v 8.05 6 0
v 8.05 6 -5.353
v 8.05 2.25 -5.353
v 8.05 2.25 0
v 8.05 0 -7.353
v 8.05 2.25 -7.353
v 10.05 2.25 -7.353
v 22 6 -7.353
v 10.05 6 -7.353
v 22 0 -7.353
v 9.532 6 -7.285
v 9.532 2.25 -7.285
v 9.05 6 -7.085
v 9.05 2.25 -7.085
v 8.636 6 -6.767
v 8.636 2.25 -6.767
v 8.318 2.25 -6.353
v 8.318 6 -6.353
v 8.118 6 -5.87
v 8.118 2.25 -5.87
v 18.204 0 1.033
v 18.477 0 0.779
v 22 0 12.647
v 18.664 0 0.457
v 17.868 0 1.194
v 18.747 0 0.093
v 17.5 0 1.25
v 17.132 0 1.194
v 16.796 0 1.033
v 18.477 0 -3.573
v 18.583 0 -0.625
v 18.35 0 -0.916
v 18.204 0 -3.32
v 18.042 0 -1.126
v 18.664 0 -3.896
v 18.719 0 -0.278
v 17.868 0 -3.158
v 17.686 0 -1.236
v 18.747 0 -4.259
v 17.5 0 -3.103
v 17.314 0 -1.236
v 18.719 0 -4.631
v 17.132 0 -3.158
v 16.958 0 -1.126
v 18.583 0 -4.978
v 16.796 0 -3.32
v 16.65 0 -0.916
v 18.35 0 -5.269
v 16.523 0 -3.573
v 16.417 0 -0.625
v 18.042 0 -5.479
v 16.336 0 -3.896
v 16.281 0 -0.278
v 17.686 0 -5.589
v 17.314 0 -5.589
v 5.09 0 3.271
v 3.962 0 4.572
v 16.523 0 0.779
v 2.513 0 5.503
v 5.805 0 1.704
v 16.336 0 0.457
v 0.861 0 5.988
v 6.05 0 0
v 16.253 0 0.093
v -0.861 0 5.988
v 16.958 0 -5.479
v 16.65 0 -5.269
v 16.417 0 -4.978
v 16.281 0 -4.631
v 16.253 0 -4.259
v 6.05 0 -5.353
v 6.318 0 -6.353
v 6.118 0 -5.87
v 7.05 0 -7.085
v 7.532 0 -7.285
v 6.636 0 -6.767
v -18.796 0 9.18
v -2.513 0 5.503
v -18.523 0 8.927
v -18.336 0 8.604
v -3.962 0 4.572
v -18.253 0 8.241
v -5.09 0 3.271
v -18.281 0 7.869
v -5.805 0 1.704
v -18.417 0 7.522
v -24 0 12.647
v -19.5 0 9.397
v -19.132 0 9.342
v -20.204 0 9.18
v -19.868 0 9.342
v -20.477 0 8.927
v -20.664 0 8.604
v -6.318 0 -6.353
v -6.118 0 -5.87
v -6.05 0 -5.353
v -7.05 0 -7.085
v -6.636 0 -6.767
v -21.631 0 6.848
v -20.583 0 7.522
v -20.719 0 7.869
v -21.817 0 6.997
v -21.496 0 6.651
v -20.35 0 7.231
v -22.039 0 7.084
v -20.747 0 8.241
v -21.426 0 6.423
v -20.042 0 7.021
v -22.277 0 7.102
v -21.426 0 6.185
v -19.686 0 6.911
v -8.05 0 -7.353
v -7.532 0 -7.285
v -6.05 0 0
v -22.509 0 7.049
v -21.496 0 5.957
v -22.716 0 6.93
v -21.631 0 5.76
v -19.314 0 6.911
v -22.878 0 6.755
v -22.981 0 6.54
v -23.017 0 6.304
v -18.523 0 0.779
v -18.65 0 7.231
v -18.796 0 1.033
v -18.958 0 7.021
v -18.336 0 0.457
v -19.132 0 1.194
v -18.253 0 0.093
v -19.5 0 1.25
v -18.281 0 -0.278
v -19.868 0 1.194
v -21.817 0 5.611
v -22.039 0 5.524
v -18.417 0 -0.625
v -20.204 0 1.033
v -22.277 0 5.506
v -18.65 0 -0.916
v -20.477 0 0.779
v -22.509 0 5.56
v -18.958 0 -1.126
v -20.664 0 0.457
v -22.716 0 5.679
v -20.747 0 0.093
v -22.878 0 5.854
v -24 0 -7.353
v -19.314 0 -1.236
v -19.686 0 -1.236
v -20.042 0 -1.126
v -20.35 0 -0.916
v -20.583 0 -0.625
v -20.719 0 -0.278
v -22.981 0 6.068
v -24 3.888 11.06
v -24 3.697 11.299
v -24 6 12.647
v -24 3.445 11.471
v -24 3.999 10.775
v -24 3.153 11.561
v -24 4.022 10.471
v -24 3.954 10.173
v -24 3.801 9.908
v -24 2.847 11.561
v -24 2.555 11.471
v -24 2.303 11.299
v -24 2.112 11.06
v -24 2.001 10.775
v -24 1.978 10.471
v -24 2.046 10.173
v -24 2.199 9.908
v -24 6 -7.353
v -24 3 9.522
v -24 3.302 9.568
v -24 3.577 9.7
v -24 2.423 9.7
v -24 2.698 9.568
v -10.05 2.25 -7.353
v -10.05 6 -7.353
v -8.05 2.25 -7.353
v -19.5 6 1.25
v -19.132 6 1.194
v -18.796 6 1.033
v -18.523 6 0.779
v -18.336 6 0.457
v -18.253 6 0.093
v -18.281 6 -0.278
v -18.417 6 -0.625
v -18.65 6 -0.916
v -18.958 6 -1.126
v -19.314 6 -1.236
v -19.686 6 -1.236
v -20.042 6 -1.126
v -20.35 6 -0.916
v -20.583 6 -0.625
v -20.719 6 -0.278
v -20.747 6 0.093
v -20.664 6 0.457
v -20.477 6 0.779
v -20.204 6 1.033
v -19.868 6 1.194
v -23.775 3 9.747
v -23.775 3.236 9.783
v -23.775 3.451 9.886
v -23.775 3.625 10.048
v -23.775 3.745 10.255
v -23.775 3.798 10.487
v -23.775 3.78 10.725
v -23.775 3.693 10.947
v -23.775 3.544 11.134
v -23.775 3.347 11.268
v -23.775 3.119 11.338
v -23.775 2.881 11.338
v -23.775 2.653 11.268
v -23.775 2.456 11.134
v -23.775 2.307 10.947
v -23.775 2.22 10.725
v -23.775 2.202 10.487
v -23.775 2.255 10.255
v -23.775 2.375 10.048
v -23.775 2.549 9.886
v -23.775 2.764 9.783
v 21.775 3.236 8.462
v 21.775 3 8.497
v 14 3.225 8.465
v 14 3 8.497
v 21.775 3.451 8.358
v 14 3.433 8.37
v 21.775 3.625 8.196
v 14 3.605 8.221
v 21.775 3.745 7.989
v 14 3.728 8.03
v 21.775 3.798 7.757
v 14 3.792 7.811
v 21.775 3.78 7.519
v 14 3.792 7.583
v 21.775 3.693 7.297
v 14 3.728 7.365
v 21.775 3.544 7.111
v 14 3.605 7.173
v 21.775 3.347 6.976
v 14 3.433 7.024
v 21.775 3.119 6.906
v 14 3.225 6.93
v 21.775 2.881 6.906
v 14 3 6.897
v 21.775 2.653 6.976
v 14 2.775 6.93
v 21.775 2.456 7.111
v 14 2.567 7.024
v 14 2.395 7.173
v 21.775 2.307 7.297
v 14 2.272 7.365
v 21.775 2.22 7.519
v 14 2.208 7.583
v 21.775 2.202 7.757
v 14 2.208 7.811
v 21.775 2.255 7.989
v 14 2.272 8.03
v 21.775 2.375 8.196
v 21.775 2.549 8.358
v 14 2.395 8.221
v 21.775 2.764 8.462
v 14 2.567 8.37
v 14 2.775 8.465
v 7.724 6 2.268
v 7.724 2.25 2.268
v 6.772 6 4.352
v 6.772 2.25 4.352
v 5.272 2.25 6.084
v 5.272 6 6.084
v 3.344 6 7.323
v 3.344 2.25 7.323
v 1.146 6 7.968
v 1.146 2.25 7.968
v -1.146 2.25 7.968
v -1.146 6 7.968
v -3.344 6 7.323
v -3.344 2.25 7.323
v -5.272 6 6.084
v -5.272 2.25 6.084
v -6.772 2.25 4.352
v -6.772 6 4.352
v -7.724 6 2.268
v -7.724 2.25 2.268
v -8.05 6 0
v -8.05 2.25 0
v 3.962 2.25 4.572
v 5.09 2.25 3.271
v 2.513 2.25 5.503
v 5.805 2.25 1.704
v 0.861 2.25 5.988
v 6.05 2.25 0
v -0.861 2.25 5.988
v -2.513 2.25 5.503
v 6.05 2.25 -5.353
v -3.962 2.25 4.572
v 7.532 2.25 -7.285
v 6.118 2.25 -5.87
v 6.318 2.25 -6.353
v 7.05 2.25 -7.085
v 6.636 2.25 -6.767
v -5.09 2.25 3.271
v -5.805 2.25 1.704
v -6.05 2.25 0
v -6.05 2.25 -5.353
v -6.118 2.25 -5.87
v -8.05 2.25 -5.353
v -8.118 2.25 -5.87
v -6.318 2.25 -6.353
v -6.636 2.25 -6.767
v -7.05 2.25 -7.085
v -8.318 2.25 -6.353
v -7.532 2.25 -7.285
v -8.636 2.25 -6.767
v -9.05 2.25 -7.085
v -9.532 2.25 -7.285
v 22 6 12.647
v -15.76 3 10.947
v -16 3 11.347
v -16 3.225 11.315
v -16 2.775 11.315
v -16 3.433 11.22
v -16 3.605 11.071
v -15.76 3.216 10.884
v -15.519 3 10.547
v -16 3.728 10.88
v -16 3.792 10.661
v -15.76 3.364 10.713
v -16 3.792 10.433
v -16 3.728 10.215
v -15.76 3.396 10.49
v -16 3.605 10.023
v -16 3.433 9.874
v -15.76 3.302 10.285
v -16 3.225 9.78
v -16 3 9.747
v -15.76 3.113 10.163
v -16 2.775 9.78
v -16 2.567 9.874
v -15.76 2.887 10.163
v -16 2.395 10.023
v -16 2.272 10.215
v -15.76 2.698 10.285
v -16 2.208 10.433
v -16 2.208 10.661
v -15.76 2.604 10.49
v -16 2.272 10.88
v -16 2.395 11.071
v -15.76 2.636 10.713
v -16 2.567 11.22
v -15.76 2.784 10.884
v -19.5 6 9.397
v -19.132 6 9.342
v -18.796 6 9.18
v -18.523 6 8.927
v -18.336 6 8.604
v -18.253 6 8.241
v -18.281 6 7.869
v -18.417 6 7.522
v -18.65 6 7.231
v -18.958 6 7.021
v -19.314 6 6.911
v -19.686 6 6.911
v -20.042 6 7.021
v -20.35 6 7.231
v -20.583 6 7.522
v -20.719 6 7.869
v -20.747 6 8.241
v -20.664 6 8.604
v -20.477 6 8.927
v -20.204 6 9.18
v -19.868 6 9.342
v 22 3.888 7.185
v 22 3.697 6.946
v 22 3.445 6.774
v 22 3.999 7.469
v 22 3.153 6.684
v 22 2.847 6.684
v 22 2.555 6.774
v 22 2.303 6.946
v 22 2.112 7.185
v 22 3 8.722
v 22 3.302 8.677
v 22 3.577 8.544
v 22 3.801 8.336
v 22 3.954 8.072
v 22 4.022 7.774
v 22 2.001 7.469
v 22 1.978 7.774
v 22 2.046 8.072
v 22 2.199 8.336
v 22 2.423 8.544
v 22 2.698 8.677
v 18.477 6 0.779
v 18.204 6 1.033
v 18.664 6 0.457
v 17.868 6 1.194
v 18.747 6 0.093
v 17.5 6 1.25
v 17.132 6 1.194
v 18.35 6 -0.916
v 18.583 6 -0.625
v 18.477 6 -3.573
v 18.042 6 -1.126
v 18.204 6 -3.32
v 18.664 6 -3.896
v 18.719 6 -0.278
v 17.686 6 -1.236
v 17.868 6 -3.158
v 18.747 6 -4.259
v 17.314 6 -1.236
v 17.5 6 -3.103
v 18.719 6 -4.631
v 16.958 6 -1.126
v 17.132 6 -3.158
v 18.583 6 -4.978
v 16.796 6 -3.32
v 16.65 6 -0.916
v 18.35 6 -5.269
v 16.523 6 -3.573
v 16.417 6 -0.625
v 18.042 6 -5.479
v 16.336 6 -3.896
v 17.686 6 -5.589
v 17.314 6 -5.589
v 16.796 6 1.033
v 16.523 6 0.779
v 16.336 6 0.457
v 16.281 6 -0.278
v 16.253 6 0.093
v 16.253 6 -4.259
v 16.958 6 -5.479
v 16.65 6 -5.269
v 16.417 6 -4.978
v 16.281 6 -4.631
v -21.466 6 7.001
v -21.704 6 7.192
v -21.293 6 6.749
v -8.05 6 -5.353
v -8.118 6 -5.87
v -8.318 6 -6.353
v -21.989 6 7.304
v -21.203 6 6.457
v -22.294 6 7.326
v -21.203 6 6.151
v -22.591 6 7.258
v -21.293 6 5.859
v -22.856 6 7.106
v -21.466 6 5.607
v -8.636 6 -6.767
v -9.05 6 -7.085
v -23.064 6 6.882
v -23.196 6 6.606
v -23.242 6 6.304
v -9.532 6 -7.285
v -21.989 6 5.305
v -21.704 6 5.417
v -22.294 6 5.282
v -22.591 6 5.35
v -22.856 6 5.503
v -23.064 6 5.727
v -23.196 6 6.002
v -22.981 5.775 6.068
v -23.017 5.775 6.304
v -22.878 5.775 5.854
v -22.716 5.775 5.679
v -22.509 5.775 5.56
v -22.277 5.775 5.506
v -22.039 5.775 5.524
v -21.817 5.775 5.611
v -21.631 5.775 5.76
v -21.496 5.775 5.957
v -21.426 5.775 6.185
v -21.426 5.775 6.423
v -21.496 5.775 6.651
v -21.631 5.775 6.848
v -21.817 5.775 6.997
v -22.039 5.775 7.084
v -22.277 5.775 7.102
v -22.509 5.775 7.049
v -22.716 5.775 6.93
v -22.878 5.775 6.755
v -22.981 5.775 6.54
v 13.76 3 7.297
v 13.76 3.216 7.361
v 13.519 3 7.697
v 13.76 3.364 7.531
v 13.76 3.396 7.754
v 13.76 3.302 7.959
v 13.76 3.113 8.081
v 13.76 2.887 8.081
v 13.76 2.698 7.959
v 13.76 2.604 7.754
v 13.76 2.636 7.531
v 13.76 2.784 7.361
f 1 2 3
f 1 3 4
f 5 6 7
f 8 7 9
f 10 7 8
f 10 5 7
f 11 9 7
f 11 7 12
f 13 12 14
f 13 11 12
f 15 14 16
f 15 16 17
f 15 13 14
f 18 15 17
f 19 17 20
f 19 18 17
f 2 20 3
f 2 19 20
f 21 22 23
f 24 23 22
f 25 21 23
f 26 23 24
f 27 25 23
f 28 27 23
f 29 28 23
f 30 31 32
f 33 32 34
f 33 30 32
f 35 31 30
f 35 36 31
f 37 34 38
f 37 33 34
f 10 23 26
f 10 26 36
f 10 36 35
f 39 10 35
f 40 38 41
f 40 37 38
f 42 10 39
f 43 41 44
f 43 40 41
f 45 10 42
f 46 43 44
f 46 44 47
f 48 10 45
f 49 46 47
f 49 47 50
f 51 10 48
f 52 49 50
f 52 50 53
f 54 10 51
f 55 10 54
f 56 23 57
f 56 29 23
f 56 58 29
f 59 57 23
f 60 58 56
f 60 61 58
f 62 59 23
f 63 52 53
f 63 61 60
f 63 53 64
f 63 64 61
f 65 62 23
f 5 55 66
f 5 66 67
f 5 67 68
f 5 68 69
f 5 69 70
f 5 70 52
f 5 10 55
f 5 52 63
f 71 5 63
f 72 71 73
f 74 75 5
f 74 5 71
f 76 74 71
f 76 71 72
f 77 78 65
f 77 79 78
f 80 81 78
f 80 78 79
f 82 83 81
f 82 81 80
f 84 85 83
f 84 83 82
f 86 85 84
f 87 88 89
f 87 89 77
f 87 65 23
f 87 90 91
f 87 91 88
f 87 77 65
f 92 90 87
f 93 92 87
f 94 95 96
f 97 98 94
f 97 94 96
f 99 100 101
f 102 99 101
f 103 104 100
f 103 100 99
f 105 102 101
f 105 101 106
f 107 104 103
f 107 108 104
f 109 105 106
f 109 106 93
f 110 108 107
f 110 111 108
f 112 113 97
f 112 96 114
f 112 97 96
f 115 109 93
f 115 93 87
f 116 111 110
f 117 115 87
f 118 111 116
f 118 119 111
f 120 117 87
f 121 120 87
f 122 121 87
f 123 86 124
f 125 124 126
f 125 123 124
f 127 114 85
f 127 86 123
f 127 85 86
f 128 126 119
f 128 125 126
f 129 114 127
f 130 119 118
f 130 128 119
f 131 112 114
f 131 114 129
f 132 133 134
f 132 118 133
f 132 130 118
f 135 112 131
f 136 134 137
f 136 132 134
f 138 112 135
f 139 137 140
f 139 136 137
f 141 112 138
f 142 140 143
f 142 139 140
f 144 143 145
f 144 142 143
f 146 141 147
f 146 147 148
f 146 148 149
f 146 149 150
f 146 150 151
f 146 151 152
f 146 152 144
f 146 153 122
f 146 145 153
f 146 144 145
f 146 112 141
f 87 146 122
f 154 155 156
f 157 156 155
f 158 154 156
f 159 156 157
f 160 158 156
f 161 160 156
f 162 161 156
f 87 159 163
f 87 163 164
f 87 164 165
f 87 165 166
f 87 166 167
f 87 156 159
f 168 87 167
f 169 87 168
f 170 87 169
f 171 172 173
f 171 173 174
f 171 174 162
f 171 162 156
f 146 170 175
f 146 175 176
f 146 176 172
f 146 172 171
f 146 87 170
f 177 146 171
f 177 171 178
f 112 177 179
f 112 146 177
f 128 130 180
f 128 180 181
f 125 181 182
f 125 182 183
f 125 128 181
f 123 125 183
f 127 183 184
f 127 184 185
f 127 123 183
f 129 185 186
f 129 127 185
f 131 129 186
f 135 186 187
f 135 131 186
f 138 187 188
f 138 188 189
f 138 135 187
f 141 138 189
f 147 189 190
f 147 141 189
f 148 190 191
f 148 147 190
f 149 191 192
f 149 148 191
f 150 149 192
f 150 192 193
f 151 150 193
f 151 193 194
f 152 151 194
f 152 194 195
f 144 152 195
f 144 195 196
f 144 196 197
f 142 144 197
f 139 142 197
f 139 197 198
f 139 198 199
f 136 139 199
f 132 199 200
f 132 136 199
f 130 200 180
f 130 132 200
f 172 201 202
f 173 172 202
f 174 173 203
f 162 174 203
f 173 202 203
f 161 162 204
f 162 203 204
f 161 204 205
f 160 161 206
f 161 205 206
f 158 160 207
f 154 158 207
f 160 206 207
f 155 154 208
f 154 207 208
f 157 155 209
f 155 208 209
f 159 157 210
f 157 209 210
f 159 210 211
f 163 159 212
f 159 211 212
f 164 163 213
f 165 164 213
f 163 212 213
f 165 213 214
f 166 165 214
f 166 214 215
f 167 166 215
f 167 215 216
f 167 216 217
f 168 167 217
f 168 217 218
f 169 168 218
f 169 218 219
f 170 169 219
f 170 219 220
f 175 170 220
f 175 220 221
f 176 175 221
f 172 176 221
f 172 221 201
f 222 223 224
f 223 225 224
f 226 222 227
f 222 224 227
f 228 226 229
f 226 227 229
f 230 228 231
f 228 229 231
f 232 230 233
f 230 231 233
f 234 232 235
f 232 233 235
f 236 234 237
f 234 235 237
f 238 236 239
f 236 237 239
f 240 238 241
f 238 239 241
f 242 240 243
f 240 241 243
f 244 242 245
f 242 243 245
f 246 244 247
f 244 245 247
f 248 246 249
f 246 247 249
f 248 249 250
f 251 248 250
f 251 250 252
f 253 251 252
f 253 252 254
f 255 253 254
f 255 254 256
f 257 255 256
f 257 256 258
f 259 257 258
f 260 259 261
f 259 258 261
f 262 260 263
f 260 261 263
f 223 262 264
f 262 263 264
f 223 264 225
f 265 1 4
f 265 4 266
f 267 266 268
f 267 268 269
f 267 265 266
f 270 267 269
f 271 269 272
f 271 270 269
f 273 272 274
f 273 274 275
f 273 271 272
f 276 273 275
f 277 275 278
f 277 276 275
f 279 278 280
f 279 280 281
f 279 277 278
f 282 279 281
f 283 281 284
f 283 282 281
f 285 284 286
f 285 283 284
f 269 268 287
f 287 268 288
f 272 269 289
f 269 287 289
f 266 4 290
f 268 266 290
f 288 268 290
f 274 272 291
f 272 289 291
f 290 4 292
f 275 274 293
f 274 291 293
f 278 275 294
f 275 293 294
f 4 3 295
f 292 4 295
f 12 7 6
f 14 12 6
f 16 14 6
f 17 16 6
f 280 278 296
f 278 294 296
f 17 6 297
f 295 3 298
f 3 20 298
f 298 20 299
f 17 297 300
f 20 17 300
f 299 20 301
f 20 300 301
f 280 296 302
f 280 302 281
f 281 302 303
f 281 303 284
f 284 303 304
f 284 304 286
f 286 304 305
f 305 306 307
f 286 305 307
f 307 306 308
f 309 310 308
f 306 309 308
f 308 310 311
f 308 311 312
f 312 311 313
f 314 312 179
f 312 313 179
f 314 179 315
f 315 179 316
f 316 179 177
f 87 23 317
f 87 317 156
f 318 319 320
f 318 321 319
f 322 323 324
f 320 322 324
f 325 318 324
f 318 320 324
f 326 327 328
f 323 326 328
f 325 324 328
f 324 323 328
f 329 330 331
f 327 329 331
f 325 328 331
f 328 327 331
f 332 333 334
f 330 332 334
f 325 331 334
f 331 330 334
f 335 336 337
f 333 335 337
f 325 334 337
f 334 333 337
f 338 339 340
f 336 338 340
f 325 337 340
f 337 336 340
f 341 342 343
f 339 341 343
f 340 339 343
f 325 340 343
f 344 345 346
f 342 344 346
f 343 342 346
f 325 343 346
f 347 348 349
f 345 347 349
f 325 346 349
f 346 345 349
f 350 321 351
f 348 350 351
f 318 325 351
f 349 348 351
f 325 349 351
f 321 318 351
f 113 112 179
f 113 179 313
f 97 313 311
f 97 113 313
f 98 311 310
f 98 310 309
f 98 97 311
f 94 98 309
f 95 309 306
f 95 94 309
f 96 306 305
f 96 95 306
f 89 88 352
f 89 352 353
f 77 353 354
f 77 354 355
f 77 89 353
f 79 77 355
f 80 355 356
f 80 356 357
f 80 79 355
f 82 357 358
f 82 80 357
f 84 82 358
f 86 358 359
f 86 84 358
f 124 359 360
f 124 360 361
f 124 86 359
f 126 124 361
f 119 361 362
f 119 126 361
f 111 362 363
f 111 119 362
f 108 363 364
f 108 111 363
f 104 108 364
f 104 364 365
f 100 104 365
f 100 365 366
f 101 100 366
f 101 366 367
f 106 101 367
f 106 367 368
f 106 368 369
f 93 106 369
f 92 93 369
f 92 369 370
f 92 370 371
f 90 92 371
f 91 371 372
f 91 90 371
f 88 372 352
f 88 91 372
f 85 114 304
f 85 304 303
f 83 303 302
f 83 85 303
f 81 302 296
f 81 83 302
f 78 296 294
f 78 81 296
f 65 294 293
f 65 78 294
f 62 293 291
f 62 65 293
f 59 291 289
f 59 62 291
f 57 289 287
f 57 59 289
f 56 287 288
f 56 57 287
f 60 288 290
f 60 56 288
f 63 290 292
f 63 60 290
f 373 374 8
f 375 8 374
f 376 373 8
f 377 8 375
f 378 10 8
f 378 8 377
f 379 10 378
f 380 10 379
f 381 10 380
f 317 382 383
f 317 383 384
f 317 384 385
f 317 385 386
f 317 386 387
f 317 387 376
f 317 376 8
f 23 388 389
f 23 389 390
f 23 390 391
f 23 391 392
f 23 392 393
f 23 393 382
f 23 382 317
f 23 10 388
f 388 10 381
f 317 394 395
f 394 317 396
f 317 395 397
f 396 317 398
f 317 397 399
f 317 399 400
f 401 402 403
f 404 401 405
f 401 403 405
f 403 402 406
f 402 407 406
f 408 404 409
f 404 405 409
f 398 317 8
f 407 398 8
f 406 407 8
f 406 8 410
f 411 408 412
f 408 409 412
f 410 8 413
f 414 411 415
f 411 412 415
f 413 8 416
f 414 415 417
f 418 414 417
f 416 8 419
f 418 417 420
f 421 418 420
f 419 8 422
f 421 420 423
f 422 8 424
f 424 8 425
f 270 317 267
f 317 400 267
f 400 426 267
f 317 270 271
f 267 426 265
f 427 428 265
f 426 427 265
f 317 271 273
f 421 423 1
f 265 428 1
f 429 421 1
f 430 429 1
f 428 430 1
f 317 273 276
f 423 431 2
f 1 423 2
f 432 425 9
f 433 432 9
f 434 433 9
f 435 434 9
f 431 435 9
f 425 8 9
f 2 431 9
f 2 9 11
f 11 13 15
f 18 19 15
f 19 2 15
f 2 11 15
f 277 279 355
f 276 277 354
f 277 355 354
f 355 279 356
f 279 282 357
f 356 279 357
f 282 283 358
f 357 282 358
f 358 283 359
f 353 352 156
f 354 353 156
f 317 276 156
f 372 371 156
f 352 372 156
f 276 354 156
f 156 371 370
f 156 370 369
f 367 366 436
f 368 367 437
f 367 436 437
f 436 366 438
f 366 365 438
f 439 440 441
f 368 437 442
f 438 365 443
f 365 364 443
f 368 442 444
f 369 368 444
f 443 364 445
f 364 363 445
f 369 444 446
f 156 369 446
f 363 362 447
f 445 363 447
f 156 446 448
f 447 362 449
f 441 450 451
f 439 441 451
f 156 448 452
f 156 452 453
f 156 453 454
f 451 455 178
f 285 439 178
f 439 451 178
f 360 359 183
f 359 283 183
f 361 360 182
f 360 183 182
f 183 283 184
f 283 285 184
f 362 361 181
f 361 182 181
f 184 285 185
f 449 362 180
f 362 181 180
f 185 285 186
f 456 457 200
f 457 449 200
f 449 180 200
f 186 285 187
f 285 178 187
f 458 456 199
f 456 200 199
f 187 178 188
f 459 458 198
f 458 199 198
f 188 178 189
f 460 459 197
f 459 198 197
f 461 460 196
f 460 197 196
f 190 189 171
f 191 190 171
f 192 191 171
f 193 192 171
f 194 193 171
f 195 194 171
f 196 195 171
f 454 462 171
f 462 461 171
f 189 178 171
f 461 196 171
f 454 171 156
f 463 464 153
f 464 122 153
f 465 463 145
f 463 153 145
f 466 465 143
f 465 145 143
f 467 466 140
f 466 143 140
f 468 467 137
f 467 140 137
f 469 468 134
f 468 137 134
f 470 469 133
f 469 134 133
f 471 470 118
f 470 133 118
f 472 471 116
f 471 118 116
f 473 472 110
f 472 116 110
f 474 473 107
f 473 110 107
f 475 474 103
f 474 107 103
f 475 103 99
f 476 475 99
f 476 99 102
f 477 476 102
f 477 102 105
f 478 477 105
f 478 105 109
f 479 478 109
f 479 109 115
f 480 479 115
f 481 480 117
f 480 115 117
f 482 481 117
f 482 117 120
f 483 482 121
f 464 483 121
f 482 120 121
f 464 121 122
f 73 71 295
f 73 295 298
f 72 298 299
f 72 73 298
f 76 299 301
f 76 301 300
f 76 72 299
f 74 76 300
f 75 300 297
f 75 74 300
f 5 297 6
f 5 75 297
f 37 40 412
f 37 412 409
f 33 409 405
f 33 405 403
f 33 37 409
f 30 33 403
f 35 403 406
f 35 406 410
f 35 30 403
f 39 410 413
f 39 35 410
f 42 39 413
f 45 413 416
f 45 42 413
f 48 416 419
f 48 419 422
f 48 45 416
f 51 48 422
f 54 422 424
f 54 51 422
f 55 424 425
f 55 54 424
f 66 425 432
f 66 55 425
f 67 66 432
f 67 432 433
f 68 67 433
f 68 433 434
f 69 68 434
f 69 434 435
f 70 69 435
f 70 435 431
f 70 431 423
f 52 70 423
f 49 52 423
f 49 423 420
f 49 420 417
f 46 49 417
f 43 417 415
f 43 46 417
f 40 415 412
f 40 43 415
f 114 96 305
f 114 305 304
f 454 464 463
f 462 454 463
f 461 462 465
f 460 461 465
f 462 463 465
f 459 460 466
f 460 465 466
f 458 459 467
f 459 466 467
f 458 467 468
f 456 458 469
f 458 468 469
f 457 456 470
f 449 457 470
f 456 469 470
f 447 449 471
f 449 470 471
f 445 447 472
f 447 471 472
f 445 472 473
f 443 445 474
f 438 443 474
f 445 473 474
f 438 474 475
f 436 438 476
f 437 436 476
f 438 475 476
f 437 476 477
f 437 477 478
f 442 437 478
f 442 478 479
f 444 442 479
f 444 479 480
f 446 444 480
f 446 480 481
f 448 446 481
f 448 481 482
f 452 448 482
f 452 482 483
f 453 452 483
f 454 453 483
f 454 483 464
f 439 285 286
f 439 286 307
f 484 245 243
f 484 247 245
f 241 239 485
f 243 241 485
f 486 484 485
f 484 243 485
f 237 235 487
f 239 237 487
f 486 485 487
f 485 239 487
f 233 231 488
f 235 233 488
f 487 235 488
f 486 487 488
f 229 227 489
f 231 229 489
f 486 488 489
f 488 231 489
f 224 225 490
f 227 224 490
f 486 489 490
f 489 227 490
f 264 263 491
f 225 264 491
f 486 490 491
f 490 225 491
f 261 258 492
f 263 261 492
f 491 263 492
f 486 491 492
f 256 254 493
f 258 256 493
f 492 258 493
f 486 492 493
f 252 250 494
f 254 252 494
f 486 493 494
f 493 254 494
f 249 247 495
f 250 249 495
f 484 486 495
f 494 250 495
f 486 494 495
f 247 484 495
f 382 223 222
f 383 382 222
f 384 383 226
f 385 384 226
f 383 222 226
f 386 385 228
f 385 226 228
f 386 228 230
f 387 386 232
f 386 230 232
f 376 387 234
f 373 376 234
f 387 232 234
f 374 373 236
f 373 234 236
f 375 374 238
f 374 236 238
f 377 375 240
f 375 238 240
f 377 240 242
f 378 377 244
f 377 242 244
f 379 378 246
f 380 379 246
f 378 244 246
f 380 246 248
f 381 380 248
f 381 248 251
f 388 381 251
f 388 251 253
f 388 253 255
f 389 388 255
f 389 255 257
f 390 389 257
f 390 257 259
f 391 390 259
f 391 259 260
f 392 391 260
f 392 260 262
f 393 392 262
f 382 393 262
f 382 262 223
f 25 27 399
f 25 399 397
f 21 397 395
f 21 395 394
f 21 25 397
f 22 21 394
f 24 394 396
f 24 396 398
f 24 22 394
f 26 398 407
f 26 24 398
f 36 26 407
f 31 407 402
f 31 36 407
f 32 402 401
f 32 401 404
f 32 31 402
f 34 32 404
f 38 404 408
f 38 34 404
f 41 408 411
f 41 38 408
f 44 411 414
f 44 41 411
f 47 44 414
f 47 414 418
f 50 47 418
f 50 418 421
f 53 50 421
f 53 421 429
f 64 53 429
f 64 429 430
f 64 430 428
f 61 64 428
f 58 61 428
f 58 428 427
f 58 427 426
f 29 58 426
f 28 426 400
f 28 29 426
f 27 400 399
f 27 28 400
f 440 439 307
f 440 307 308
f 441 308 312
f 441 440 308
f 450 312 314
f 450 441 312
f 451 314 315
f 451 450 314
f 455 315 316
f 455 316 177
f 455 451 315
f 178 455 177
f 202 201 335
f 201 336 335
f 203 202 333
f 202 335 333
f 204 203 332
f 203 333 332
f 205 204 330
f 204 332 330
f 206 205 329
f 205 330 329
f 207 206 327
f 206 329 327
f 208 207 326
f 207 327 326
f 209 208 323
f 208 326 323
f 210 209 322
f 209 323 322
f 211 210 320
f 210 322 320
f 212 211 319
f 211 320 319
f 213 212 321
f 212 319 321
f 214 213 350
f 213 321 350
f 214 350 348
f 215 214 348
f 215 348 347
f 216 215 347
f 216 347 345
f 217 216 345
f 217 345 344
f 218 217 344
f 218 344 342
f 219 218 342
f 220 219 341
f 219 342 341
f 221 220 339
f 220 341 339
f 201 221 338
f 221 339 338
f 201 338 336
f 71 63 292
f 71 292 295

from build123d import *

# Parameters (mm, degrees)
SKETCH3_R                   = 1.25
BOSS_EXTRUDE1_DEPTH         = 6
CUT_EXTRUDE1_DEPTH          = 3.75
M2_TAPPED_HOLE1_D           = 1.6
M2_TAPPED_HOLE1_DEPTH       = 8
M2_TAPPED_HOLE1_CSINK_D     = 2.05
M2_TAPPED_HOLE1_CSINK_ANGLE = 90
M2_TAPPED_HOLE1_TIP         = 0.480688495
M2_TAPPED_HOLE2_D           = 1.6
M2_TAPPED_HOLE2_DEPTH       = 8
M2_TAPPED_HOLE2_CSINK_D     = 2.05
M2_TAPPED_HOLE2_CSINK_ANGLE = 90
M2_TAPPED_HOLE2_TIP         = 0.480688495
M2_TAPPED_HOLE3_D           = 1.6
M2_TAPPED_HOLE3_DEPTH       = 6
M2_TAPPED_HOLE3_CSINK_D     = 2.05
M2_TAPPED_HOLE3_CSINK_ANGLE = 90
M2_TAPPED_HOLE3_TIP         = 0.480688495


with BuildPart() as part:
    # Sketch3 → Boss-Extrude1 (new body)
    with BuildSketch(Plane(origin=(0, 0, 0), x_dir=(1, 0, 0), z_dir=(0, 1, 0))):
        with BuildLine():
            Line((-24, 7.352825763), (-8.05, 7.352825763))
            ThreePointArc((-8.05, 7.352825763), (-6.635786438, 6.767039326), (-6.05, 5.352825763))
            Line((-6.05, 5.352825763), (-6.05, 0))
            ThreePointArc((-6.05, 0), (0, -6.05), (6.05, 0))
            Line((6.05, 0), (6.05, 5.352825763))
            ThreePointArc((6.05, 5.352825763), (6.635786438, 6.767039326), (8.05, 7.352825763))
            Line((8.05, 7.352825763), (22, 7.352825763))
            Line((22, 7.352825763), (22, -12.647174237))
            Line((22, -12.647174237), (-24, -12.647174237))
            Line((-24, -12.647174237), (-24, 7.352825763))
        make_face()
        with Locations(Location((-19.5, -8.147174237, 0), (0, 0, 270))):
            Circle(SKETCH3_R, mode=Mode.SUBTRACT)
        with Locations(Location((17.5, 4.352825763, 0), (0, 0, 270))):
            Circle(SKETCH3_R, mode=Mode.SUBTRACT)
        with Locations(Location((17.5, 0, 0), (0, 0, 270))):
            Circle(SKETCH3_R, mode=Mode.SUBTRACT)
        with Locations(Location((-19.5, 0, 0), (0, 0, 270))):
            Circle(SKETCH3_R, mode=Mode.SUBTRACT)
    extrude(amount=BOSS_EXTRUDE1_DEPTH)

    # Sketch6 → Cut-Extrude1 (cut)
    with BuildSketch(Plane(origin=(0, 6, 0), x_dir=(1, 0, 0), z_dir=(0, 1, 0))):
        with BuildLine():
            Line((-8.05, 0), (-8.05, 5.352825763))
            ThreePointArc((-8.05, 5.352825763), (-8.635786438, 6.767039326), (-10.05, 7.352825763))
            Line((-10.05, 7.352825763), (10.05, 7.352825763))
            ThreePointArc((10.05, 7.352825763), (8.635786438, 6.767039326), (8.05, 5.352825763))
            Line((8.05, 5.352825763), (8.05, 0))
            ThreePointArc((8.05, 0), (0, -8.05), (-8.05, 0))
        make_face()
    extrude(amount=-CUT_EXTRUDE1_DEPTH, mode=Mode.SUBTRACT)

    # M2 Tapped Hole1
    with Locations(Plane(origin=(22, 0, 0), x_dir=(0, 0, -1), z_dir=(1, 0, 0))):
        with Locations((-7.697174237, 3)):
            CounterSinkHole(M2_TAPPED_HOLE1_D / 2, M2_TAPPED_HOLE1_CSINK_D / 2, depth=M2_TAPPED_HOLE1_DEPTH, counter_sink_angle=M2_TAPPED_HOLE1_CSINK_ANGLE)
            with Locations((0, 0, -(M2_TAPPED_HOLE1_DEPTH + M2_TAPPED_HOLE1_TIP / 2))):  # 118° drill point
                Cone(0, M2_TAPPED_HOLE1_D / 2, M2_TAPPED_HOLE1_TIP, mode=Mode.SUBTRACT)

    # M2 Tapped Hole2
    with Locations(Plane.ZY.offset(24)):
        with Locations((10.547174237, 3)):
            CounterSinkHole(M2_TAPPED_HOLE2_D / 2, M2_TAPPED_HOLE2_CSINK_D / 2, depth=M2_TAPPED_HOLE2_DEPTH, counter_sink_angle=M2_TAPPED_HOLE2_CSINK_ANGLE)
            with Locations((0, 0, -(M2_TAPPED_HOLE2_DEPTH + M2_TAPPED_HOLE2_TIP / 2))):  # 118° drill point
                Cone(0, M2_TAPPED_HOLE2_D / 2, M2_TAPPED_HOLE2_TIP, mode=Mode.SUBTRACT)

    # M2 Tapped Hole3
    with Locations(Plane(origin=(0, 6, 0), x_dir=(1, 0, 0), z_dir=(0, 1, 0))):
        with Locations((-22.216954316, -6.30420158)):
            CounterSinkHole(M2_TAPPED_HOLE3_D / 2, M2_TAPPED_HOLE3_CSINK_D / 2, depth=M2_TAPPED_HOLE3_DEPTH, counter_sink_angle=M2_TAPPED_HOLE3_CSINK_ANGLE)
            with Locations((0, 0, -(M2_TAPPED_HOLE3_DEPTH + M2_TAPPED_HOLE3_TIP / 2))):  # 118° drill point
                Cone(0, M2_TAPPED_HOLE3_D / 2, M2_TAPPED_HOLE3_TIP, mode=Mode.SUBTRACT)


solid = part.part
